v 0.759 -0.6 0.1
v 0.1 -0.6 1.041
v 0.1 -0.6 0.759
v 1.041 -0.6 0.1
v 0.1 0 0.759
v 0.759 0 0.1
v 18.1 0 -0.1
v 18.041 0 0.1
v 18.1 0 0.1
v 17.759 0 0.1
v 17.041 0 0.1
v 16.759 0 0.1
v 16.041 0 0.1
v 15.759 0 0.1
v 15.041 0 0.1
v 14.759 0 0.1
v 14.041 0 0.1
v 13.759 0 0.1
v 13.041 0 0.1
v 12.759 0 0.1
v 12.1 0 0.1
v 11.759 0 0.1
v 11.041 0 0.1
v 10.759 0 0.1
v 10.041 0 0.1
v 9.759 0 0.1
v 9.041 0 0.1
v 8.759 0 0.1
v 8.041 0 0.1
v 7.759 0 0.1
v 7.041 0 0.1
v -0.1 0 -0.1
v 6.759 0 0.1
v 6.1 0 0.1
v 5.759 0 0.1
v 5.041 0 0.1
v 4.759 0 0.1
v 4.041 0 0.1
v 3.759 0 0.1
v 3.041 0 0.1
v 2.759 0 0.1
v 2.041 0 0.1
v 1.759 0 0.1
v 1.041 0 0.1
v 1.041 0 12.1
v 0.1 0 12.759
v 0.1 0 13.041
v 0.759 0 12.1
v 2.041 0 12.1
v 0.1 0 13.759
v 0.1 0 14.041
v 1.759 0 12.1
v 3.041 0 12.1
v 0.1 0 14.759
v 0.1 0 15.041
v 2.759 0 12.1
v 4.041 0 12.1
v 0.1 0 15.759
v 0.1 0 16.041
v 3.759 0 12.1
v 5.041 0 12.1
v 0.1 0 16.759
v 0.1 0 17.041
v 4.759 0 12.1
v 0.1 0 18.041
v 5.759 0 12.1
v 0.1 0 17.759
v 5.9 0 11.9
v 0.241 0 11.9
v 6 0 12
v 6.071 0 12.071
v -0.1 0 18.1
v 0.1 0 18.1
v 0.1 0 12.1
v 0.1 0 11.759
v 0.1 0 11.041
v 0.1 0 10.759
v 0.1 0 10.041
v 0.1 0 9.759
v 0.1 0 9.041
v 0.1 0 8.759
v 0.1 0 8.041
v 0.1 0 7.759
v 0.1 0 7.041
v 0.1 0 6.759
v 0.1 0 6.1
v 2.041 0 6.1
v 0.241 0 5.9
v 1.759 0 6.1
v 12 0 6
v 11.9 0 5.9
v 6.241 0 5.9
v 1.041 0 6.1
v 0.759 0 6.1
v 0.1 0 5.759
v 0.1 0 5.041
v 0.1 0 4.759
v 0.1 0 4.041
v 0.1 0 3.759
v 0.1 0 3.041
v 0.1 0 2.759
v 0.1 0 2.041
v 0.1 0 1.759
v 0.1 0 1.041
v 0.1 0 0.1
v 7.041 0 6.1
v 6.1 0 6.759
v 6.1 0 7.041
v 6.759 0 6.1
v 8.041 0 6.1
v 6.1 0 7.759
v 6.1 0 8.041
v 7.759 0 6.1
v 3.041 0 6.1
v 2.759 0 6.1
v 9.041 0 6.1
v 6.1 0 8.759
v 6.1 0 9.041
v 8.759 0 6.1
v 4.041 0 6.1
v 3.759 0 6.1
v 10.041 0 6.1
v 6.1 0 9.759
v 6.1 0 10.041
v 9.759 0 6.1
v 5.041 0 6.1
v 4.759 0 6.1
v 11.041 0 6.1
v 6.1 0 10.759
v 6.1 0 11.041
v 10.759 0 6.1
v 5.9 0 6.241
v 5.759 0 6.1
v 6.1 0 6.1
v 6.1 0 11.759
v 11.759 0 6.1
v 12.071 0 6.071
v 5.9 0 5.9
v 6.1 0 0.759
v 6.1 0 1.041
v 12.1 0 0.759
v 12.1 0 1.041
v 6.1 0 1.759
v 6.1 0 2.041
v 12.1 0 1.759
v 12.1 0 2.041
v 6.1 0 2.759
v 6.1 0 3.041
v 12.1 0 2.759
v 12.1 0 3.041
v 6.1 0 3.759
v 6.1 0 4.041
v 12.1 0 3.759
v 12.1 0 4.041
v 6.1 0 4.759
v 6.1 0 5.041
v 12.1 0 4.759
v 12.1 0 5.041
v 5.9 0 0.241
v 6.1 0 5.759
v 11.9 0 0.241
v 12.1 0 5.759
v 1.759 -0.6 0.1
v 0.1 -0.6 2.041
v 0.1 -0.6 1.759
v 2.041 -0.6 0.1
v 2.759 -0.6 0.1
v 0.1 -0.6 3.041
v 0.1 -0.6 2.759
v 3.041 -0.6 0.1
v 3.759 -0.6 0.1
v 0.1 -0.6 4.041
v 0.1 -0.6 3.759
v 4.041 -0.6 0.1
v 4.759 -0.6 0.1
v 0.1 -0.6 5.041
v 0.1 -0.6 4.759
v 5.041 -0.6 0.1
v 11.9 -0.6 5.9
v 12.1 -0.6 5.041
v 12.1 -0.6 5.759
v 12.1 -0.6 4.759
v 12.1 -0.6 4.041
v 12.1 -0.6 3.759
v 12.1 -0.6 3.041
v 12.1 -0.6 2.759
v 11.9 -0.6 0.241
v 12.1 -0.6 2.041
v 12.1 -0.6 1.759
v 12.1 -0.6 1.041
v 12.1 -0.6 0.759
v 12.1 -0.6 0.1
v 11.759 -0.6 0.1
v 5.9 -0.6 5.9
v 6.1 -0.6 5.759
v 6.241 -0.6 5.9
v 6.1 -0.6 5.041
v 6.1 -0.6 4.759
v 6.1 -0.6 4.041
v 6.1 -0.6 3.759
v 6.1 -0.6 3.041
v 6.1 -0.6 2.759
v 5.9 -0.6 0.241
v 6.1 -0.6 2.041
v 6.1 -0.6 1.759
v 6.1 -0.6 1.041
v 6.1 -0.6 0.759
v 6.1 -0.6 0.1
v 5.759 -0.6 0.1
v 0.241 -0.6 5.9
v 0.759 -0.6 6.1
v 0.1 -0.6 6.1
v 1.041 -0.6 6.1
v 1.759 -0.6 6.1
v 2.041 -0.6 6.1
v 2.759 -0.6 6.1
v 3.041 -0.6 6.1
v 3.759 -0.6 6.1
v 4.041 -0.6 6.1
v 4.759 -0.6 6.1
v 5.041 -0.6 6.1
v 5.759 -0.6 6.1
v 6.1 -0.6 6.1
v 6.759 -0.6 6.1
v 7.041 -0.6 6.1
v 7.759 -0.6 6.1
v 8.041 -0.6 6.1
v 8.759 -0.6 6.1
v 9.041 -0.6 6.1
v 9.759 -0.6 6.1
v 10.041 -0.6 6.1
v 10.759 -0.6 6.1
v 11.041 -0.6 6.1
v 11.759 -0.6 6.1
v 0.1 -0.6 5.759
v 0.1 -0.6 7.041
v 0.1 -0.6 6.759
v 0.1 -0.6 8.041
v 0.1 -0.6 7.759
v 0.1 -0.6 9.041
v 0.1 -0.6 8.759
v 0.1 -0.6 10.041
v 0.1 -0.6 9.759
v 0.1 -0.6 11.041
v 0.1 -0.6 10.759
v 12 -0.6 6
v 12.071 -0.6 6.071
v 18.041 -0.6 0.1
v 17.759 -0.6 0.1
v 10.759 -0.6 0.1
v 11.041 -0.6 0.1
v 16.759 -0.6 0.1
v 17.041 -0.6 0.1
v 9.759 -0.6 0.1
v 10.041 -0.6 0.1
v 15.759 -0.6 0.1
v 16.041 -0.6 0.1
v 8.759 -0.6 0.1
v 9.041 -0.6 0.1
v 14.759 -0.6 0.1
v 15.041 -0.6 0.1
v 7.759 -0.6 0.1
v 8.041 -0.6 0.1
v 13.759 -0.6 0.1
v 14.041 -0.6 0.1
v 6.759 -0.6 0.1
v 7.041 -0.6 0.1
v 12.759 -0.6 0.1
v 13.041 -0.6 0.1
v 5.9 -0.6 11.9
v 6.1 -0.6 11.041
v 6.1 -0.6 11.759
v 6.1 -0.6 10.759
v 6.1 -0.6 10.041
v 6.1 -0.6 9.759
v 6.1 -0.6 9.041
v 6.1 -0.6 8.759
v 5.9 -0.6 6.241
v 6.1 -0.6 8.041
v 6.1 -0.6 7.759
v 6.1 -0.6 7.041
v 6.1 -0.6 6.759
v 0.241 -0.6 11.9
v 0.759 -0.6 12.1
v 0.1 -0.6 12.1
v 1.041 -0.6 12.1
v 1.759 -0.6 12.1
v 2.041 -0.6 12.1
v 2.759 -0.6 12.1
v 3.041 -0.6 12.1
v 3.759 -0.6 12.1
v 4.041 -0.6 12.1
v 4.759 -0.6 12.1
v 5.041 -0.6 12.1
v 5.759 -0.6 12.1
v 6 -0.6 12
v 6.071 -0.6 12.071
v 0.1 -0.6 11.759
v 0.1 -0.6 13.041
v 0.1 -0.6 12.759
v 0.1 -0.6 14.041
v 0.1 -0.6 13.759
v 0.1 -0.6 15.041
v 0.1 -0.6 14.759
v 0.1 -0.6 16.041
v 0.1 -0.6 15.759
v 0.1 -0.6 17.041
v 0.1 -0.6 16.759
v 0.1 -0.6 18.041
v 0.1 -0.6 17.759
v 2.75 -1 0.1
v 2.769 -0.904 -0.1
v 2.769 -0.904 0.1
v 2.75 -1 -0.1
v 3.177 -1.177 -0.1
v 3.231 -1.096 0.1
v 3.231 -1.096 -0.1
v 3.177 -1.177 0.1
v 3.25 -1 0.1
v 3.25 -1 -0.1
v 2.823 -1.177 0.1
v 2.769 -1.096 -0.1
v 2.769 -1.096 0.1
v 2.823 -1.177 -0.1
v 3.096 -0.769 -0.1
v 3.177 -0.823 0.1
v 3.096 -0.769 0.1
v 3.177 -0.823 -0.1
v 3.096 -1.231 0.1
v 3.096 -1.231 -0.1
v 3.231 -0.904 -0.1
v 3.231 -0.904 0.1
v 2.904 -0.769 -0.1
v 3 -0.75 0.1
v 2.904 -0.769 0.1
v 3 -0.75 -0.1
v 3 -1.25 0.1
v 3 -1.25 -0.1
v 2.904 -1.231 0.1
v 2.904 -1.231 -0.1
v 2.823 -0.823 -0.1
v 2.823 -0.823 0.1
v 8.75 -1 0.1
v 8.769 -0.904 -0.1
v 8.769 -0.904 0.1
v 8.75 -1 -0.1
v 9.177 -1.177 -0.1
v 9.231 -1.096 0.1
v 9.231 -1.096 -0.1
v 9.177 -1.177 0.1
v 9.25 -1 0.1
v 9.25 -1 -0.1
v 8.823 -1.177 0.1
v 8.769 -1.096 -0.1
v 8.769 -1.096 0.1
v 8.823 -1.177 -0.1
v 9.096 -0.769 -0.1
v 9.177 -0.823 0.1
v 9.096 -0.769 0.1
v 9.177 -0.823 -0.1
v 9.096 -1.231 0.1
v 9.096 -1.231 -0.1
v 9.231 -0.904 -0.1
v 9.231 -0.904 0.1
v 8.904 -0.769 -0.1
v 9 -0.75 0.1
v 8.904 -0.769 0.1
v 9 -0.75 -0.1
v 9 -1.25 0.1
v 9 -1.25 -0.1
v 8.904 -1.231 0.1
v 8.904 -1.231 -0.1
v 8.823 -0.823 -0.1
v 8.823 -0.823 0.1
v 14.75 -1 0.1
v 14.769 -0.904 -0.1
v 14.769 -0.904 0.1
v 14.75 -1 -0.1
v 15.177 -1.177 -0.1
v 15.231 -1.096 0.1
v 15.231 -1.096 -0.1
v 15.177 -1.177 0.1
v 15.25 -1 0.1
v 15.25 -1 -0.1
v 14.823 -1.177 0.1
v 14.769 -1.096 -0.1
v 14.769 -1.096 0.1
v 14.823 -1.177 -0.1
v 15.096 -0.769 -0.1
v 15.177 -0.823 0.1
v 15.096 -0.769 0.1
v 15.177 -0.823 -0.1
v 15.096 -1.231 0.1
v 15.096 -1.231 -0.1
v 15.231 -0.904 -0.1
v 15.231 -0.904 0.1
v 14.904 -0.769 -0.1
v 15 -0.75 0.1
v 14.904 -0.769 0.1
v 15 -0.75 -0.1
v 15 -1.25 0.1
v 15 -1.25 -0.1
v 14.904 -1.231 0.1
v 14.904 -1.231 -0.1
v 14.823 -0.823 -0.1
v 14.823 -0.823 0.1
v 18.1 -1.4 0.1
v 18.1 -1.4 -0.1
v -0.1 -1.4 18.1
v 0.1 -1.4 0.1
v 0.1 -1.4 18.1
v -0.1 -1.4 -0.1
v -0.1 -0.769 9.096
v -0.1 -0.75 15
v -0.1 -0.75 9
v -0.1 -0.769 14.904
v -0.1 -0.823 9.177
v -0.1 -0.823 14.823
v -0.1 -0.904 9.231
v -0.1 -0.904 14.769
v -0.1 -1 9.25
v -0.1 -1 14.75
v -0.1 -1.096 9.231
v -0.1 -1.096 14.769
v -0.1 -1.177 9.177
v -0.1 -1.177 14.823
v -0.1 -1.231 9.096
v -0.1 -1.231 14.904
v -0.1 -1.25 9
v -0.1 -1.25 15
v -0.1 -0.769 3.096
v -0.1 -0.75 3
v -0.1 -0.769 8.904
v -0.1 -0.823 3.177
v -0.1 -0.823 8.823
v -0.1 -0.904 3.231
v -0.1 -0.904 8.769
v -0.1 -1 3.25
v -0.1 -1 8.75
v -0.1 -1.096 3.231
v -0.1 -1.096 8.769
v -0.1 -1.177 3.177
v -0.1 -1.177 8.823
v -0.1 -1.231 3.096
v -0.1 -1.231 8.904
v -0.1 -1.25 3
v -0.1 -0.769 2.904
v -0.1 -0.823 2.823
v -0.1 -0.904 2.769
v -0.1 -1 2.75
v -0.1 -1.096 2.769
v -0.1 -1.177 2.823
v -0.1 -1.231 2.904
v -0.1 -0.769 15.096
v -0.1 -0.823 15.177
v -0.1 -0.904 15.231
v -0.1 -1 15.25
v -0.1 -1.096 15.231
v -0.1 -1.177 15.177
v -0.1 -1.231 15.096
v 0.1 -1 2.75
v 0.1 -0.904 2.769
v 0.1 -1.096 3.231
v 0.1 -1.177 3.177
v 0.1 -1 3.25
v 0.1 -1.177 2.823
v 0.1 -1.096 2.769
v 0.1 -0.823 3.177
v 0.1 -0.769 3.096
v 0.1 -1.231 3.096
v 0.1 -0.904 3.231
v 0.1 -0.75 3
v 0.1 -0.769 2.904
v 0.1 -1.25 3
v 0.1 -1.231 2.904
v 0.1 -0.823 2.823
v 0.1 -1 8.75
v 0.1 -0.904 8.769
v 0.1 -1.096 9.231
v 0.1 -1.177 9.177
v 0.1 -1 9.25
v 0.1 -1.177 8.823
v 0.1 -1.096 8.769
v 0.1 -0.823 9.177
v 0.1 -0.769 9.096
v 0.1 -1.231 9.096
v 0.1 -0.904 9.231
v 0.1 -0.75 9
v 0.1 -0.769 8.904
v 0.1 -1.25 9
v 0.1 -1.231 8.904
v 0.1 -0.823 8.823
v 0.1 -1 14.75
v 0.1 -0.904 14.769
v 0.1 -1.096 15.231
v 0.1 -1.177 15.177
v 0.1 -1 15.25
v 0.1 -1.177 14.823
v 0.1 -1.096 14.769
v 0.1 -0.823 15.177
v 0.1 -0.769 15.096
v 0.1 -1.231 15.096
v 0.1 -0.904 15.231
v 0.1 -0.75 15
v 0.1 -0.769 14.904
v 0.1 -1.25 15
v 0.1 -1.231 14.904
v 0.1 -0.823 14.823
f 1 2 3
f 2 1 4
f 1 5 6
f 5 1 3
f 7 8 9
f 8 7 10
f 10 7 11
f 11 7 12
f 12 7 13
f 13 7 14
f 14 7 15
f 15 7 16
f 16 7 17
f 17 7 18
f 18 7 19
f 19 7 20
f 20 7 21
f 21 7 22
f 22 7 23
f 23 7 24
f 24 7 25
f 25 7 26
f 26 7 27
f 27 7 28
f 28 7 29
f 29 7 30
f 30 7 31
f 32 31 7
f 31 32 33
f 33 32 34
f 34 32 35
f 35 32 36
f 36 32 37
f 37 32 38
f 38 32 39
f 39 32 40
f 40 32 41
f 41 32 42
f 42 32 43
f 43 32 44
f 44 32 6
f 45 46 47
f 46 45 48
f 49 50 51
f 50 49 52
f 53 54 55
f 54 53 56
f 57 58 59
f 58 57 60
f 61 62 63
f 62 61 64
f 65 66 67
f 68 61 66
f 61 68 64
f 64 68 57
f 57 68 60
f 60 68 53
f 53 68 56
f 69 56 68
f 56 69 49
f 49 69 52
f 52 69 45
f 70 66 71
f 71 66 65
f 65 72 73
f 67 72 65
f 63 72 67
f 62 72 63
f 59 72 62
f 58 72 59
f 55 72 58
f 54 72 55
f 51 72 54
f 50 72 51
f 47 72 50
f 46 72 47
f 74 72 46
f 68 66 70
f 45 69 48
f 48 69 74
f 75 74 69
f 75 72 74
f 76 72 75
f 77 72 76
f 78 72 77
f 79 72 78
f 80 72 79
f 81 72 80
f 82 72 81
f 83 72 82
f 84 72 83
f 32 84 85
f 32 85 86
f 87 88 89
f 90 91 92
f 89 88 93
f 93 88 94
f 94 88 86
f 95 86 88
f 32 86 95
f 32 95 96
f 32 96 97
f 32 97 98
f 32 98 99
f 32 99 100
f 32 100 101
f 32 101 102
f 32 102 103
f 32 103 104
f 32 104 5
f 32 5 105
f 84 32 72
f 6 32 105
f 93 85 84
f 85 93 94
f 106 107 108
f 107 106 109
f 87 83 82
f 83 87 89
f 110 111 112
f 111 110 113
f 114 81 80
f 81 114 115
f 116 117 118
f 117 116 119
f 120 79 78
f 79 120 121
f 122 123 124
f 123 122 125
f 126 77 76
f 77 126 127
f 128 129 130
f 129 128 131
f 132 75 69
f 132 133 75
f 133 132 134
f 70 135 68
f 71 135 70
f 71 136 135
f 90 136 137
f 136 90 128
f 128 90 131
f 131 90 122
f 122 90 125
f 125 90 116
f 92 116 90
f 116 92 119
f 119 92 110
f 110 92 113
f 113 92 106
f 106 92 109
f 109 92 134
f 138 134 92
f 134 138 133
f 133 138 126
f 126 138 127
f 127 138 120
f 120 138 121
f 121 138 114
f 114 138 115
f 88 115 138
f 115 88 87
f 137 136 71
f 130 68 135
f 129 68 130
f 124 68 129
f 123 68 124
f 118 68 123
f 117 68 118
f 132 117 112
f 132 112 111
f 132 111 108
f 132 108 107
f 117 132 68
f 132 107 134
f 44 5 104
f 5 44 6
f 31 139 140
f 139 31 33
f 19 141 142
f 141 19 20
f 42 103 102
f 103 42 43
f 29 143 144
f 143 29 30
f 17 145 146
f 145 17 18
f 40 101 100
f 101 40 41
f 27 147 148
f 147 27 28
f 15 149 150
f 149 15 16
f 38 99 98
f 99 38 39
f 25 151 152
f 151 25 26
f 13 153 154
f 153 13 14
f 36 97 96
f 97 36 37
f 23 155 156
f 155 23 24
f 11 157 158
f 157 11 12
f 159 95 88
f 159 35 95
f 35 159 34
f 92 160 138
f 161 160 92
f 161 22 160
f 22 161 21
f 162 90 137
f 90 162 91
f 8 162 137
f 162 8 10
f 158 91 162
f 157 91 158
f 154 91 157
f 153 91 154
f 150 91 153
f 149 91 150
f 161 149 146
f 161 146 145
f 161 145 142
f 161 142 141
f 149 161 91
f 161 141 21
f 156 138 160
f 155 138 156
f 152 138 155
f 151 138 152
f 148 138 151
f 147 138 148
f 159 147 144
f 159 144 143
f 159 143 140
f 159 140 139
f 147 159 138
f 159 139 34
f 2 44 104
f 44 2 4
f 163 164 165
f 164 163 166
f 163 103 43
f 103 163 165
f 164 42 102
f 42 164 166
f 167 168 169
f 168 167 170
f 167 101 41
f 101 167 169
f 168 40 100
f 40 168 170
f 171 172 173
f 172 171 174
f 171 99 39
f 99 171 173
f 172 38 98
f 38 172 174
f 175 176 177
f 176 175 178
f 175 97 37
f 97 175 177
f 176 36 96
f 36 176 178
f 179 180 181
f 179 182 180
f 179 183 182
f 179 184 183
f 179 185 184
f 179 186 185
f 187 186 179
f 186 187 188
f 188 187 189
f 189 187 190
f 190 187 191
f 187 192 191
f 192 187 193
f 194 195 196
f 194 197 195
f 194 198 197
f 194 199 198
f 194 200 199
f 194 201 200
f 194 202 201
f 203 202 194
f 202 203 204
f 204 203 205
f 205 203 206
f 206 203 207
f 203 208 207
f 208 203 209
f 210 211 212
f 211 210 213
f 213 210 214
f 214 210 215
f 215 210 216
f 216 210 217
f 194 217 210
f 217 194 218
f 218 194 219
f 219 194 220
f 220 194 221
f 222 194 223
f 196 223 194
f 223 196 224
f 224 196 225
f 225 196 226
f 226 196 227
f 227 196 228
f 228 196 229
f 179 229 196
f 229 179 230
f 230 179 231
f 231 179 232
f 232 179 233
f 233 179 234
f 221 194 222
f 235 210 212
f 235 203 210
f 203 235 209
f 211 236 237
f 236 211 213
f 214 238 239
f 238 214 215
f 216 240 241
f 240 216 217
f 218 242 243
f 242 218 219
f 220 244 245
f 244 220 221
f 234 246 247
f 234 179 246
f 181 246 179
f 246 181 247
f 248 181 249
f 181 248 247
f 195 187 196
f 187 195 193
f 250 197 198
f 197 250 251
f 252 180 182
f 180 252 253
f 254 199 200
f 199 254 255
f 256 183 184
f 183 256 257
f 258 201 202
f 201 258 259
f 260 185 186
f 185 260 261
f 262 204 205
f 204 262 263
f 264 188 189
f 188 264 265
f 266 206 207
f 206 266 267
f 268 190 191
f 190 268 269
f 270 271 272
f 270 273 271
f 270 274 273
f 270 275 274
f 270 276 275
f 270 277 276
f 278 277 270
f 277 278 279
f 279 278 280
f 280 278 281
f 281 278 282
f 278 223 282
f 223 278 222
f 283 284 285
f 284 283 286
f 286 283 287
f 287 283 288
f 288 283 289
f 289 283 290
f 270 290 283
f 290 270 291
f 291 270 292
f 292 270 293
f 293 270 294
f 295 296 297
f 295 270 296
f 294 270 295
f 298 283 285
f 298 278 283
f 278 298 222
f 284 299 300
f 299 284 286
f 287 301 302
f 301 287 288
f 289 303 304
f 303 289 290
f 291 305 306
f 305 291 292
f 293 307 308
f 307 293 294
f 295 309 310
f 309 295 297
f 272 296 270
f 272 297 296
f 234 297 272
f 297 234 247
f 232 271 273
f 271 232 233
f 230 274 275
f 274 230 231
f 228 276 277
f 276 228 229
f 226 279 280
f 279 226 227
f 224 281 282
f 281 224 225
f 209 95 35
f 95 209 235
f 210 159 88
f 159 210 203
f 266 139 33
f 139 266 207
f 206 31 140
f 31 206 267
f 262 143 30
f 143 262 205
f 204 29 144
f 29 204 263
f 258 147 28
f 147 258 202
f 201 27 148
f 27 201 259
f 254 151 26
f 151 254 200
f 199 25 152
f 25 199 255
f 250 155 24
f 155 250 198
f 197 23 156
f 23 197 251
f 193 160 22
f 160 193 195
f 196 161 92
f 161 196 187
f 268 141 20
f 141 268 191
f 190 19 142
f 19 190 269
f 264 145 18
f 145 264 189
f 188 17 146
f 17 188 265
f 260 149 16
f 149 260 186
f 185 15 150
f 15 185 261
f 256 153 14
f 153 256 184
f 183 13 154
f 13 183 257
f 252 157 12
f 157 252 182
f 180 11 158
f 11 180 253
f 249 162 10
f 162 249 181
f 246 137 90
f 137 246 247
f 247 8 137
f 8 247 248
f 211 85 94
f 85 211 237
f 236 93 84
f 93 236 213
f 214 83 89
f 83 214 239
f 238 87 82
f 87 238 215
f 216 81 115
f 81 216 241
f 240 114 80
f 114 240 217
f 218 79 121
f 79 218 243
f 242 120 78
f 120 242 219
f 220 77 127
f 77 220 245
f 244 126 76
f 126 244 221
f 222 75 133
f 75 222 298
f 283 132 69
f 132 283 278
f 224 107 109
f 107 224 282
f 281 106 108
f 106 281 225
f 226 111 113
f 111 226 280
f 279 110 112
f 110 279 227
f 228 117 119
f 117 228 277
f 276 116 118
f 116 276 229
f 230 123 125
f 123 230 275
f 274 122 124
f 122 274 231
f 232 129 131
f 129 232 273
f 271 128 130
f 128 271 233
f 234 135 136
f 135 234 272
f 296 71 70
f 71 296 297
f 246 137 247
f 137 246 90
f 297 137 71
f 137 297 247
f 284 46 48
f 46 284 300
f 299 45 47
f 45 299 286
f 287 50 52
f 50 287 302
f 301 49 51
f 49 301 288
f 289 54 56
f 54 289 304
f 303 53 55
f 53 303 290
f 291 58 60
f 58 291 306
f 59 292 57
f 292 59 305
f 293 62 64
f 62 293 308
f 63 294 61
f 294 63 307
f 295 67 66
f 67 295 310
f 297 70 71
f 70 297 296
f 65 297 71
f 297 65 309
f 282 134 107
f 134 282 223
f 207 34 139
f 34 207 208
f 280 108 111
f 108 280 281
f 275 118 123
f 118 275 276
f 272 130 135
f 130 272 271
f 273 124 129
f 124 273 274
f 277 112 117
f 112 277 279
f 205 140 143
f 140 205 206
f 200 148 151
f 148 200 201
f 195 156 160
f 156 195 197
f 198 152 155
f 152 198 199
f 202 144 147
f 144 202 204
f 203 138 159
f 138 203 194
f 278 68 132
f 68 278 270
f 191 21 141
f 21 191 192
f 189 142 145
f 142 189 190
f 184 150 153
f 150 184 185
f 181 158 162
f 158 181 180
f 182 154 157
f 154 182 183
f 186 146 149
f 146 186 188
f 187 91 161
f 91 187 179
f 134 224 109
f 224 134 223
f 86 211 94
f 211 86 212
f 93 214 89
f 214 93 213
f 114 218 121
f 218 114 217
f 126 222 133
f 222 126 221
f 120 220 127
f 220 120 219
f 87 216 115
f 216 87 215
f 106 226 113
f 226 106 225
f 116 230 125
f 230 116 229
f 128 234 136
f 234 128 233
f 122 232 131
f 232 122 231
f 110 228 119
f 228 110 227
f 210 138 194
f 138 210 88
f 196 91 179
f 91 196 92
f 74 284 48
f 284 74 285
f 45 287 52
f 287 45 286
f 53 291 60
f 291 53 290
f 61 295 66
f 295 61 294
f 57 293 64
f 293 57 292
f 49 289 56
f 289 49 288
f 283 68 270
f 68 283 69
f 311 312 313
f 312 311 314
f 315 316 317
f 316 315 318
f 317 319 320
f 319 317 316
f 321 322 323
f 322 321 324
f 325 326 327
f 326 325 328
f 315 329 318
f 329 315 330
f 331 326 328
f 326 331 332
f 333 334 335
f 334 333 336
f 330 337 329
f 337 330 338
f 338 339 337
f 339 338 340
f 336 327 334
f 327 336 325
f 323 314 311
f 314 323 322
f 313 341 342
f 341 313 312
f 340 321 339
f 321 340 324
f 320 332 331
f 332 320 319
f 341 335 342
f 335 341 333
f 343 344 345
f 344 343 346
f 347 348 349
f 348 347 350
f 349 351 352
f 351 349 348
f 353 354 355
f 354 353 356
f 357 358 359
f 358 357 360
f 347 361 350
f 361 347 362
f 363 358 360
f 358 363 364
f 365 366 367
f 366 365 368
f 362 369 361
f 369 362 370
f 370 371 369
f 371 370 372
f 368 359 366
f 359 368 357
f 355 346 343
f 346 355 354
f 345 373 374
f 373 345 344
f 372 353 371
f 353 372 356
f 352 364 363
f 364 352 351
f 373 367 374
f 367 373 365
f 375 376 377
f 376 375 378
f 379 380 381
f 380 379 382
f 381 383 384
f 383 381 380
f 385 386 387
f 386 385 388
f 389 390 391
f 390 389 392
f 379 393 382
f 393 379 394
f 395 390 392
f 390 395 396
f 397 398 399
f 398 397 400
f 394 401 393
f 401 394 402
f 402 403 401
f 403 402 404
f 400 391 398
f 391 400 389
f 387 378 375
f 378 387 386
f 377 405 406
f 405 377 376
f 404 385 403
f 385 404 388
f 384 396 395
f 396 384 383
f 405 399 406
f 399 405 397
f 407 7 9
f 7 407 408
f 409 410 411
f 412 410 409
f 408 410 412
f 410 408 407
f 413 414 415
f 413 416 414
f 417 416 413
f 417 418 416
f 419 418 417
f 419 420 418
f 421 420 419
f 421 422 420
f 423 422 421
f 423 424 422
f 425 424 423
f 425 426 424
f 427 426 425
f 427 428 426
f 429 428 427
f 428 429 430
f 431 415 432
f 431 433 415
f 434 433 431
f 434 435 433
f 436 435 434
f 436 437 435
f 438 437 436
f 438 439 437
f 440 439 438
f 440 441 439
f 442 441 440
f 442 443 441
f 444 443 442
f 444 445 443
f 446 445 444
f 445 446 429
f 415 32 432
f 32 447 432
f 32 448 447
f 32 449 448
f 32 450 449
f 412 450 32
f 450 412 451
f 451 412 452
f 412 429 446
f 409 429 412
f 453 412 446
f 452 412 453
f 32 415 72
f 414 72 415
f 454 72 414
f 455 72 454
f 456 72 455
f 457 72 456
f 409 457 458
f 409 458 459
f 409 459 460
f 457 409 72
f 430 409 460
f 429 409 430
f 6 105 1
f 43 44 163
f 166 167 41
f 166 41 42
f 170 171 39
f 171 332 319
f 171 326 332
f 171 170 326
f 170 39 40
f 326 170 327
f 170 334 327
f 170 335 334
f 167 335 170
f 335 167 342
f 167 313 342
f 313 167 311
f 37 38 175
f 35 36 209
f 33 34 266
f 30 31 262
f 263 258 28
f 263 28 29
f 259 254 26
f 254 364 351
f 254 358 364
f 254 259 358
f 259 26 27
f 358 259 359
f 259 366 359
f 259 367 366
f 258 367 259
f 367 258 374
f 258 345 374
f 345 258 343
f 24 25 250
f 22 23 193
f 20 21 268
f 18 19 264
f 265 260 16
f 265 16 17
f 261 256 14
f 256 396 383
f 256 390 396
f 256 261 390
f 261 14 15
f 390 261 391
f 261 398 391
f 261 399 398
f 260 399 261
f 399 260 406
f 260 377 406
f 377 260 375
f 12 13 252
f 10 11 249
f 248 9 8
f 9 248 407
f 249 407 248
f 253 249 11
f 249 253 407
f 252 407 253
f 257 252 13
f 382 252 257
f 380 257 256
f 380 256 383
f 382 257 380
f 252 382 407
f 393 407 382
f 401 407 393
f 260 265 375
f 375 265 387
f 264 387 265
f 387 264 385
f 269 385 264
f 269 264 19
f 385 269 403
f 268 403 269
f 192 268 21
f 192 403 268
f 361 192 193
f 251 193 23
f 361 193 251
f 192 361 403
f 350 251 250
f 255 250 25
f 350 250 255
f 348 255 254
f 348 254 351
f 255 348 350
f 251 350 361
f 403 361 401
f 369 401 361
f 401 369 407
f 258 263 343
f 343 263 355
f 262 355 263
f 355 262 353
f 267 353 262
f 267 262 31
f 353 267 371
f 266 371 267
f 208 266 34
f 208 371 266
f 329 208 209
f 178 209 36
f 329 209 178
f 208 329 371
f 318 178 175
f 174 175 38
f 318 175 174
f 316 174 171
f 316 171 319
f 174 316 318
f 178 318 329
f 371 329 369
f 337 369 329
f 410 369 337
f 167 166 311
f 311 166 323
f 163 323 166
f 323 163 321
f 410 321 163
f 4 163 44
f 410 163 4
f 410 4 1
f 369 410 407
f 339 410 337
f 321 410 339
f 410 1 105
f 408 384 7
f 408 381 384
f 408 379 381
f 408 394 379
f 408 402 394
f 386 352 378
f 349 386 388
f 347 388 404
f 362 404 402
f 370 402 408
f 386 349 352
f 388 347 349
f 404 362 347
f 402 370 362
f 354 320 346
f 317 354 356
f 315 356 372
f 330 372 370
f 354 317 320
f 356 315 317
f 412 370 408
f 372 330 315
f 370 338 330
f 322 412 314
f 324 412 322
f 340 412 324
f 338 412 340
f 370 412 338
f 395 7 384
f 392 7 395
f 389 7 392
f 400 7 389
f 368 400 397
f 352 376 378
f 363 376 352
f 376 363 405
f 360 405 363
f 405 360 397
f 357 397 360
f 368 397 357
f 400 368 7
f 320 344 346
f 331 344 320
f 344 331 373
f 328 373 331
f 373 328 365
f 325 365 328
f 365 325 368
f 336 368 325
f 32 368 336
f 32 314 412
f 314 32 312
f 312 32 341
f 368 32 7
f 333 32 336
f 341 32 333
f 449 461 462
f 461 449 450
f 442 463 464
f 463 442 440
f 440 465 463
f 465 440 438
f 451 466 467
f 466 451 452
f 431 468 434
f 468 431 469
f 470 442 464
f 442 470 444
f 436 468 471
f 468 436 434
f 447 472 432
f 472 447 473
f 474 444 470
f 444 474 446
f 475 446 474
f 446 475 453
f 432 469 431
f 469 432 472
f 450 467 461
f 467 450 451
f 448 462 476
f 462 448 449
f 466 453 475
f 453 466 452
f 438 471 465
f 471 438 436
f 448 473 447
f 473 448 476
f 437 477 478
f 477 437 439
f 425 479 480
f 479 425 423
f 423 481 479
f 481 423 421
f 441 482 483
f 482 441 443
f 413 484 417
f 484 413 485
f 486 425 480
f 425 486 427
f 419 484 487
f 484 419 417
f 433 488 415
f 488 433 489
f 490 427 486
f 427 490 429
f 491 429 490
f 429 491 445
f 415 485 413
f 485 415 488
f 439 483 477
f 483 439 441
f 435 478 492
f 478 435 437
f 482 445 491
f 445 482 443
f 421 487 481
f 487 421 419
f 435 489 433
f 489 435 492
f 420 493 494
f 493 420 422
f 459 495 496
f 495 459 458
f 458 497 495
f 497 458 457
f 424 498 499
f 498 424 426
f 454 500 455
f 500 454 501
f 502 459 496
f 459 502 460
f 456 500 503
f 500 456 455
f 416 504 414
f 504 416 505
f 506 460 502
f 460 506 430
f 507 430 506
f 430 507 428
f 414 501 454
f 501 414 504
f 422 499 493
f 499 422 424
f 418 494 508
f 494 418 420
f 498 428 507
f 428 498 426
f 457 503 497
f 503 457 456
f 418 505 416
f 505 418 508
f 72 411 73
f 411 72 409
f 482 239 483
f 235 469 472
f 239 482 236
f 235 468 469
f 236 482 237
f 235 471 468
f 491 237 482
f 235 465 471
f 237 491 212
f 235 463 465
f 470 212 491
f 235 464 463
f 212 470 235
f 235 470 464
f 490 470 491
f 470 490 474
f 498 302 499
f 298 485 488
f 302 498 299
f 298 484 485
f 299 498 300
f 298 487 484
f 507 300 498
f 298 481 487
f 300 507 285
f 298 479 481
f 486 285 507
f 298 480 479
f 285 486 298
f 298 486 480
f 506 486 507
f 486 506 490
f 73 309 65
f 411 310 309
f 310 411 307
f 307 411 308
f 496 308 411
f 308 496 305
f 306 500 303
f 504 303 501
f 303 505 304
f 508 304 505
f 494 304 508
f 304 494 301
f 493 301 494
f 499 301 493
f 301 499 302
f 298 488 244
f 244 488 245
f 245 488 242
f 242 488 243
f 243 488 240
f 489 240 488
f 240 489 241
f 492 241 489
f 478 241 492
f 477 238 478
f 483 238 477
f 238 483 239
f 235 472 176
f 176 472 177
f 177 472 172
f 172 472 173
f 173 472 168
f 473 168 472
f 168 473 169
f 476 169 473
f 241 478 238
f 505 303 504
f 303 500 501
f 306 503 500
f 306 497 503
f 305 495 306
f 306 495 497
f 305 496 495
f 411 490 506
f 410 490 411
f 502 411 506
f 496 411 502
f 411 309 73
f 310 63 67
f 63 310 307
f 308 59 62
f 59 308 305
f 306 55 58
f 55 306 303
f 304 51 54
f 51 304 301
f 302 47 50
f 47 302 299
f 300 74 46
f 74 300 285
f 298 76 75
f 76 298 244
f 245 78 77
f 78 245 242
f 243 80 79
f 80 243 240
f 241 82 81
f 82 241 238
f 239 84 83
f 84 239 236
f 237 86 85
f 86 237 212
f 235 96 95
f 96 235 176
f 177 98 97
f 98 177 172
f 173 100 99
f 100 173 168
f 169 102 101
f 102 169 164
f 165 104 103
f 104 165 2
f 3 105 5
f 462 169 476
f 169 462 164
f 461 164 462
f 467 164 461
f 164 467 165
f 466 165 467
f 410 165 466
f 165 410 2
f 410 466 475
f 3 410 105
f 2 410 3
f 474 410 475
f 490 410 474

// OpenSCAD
$fs=.1;

module strips(kk_max, width, height) {
for (kk=[1:kk_max])
    translate([kk,0,0])
    rotate(45)
    translate([-width/2,0,0])
    cube([width,sqrt(2)*kk,height]);
}

module side(stripes_count, repeat, width, height, height_side)
{
    difference() {
        translate([-width/2,-width/2,0])
        cube([stripes_count*repeat+width,width,height+height_side]);
        for (kk=[0:stripes_count-1])
        translate([stripes_count*(kk+1/2),0,height+height_side/2])
        rotate(90,[1,0,0])
        cylinder(d=.5, h=3*width, center=true);
    }
}

module shelf(stripes_count=6, repeat=3, width=.2, height=.6, height_side=.8) {

for (ii=[0:repeat-1])
for (jj=[0:repeat-1])
if (ii<repeat-jj)
    translate([stripes_count*jj,stripes_count*ii,0])
    strips(stripes_count, width, height);

for (ii=[1:repeat-1])
    translate([stripes_count*ii-width/2,0,0])
    cube([width,(repeat-ii)*stripes_count,height]);

for (jj=[1:repeat-1])
    translate([0,stripes_count*jj-width/2,0])
    cube([(repeat-jj)*stripes_count,width,height]);

side(stripes_count, repeat, width, height, height_side);

scale([1,-1,1])
rotate(-90)
side(stripes_count, repeat, width, height, height_side);

}


rotate(90,[1,0,0])
scale([1,1,1]) shelf();
